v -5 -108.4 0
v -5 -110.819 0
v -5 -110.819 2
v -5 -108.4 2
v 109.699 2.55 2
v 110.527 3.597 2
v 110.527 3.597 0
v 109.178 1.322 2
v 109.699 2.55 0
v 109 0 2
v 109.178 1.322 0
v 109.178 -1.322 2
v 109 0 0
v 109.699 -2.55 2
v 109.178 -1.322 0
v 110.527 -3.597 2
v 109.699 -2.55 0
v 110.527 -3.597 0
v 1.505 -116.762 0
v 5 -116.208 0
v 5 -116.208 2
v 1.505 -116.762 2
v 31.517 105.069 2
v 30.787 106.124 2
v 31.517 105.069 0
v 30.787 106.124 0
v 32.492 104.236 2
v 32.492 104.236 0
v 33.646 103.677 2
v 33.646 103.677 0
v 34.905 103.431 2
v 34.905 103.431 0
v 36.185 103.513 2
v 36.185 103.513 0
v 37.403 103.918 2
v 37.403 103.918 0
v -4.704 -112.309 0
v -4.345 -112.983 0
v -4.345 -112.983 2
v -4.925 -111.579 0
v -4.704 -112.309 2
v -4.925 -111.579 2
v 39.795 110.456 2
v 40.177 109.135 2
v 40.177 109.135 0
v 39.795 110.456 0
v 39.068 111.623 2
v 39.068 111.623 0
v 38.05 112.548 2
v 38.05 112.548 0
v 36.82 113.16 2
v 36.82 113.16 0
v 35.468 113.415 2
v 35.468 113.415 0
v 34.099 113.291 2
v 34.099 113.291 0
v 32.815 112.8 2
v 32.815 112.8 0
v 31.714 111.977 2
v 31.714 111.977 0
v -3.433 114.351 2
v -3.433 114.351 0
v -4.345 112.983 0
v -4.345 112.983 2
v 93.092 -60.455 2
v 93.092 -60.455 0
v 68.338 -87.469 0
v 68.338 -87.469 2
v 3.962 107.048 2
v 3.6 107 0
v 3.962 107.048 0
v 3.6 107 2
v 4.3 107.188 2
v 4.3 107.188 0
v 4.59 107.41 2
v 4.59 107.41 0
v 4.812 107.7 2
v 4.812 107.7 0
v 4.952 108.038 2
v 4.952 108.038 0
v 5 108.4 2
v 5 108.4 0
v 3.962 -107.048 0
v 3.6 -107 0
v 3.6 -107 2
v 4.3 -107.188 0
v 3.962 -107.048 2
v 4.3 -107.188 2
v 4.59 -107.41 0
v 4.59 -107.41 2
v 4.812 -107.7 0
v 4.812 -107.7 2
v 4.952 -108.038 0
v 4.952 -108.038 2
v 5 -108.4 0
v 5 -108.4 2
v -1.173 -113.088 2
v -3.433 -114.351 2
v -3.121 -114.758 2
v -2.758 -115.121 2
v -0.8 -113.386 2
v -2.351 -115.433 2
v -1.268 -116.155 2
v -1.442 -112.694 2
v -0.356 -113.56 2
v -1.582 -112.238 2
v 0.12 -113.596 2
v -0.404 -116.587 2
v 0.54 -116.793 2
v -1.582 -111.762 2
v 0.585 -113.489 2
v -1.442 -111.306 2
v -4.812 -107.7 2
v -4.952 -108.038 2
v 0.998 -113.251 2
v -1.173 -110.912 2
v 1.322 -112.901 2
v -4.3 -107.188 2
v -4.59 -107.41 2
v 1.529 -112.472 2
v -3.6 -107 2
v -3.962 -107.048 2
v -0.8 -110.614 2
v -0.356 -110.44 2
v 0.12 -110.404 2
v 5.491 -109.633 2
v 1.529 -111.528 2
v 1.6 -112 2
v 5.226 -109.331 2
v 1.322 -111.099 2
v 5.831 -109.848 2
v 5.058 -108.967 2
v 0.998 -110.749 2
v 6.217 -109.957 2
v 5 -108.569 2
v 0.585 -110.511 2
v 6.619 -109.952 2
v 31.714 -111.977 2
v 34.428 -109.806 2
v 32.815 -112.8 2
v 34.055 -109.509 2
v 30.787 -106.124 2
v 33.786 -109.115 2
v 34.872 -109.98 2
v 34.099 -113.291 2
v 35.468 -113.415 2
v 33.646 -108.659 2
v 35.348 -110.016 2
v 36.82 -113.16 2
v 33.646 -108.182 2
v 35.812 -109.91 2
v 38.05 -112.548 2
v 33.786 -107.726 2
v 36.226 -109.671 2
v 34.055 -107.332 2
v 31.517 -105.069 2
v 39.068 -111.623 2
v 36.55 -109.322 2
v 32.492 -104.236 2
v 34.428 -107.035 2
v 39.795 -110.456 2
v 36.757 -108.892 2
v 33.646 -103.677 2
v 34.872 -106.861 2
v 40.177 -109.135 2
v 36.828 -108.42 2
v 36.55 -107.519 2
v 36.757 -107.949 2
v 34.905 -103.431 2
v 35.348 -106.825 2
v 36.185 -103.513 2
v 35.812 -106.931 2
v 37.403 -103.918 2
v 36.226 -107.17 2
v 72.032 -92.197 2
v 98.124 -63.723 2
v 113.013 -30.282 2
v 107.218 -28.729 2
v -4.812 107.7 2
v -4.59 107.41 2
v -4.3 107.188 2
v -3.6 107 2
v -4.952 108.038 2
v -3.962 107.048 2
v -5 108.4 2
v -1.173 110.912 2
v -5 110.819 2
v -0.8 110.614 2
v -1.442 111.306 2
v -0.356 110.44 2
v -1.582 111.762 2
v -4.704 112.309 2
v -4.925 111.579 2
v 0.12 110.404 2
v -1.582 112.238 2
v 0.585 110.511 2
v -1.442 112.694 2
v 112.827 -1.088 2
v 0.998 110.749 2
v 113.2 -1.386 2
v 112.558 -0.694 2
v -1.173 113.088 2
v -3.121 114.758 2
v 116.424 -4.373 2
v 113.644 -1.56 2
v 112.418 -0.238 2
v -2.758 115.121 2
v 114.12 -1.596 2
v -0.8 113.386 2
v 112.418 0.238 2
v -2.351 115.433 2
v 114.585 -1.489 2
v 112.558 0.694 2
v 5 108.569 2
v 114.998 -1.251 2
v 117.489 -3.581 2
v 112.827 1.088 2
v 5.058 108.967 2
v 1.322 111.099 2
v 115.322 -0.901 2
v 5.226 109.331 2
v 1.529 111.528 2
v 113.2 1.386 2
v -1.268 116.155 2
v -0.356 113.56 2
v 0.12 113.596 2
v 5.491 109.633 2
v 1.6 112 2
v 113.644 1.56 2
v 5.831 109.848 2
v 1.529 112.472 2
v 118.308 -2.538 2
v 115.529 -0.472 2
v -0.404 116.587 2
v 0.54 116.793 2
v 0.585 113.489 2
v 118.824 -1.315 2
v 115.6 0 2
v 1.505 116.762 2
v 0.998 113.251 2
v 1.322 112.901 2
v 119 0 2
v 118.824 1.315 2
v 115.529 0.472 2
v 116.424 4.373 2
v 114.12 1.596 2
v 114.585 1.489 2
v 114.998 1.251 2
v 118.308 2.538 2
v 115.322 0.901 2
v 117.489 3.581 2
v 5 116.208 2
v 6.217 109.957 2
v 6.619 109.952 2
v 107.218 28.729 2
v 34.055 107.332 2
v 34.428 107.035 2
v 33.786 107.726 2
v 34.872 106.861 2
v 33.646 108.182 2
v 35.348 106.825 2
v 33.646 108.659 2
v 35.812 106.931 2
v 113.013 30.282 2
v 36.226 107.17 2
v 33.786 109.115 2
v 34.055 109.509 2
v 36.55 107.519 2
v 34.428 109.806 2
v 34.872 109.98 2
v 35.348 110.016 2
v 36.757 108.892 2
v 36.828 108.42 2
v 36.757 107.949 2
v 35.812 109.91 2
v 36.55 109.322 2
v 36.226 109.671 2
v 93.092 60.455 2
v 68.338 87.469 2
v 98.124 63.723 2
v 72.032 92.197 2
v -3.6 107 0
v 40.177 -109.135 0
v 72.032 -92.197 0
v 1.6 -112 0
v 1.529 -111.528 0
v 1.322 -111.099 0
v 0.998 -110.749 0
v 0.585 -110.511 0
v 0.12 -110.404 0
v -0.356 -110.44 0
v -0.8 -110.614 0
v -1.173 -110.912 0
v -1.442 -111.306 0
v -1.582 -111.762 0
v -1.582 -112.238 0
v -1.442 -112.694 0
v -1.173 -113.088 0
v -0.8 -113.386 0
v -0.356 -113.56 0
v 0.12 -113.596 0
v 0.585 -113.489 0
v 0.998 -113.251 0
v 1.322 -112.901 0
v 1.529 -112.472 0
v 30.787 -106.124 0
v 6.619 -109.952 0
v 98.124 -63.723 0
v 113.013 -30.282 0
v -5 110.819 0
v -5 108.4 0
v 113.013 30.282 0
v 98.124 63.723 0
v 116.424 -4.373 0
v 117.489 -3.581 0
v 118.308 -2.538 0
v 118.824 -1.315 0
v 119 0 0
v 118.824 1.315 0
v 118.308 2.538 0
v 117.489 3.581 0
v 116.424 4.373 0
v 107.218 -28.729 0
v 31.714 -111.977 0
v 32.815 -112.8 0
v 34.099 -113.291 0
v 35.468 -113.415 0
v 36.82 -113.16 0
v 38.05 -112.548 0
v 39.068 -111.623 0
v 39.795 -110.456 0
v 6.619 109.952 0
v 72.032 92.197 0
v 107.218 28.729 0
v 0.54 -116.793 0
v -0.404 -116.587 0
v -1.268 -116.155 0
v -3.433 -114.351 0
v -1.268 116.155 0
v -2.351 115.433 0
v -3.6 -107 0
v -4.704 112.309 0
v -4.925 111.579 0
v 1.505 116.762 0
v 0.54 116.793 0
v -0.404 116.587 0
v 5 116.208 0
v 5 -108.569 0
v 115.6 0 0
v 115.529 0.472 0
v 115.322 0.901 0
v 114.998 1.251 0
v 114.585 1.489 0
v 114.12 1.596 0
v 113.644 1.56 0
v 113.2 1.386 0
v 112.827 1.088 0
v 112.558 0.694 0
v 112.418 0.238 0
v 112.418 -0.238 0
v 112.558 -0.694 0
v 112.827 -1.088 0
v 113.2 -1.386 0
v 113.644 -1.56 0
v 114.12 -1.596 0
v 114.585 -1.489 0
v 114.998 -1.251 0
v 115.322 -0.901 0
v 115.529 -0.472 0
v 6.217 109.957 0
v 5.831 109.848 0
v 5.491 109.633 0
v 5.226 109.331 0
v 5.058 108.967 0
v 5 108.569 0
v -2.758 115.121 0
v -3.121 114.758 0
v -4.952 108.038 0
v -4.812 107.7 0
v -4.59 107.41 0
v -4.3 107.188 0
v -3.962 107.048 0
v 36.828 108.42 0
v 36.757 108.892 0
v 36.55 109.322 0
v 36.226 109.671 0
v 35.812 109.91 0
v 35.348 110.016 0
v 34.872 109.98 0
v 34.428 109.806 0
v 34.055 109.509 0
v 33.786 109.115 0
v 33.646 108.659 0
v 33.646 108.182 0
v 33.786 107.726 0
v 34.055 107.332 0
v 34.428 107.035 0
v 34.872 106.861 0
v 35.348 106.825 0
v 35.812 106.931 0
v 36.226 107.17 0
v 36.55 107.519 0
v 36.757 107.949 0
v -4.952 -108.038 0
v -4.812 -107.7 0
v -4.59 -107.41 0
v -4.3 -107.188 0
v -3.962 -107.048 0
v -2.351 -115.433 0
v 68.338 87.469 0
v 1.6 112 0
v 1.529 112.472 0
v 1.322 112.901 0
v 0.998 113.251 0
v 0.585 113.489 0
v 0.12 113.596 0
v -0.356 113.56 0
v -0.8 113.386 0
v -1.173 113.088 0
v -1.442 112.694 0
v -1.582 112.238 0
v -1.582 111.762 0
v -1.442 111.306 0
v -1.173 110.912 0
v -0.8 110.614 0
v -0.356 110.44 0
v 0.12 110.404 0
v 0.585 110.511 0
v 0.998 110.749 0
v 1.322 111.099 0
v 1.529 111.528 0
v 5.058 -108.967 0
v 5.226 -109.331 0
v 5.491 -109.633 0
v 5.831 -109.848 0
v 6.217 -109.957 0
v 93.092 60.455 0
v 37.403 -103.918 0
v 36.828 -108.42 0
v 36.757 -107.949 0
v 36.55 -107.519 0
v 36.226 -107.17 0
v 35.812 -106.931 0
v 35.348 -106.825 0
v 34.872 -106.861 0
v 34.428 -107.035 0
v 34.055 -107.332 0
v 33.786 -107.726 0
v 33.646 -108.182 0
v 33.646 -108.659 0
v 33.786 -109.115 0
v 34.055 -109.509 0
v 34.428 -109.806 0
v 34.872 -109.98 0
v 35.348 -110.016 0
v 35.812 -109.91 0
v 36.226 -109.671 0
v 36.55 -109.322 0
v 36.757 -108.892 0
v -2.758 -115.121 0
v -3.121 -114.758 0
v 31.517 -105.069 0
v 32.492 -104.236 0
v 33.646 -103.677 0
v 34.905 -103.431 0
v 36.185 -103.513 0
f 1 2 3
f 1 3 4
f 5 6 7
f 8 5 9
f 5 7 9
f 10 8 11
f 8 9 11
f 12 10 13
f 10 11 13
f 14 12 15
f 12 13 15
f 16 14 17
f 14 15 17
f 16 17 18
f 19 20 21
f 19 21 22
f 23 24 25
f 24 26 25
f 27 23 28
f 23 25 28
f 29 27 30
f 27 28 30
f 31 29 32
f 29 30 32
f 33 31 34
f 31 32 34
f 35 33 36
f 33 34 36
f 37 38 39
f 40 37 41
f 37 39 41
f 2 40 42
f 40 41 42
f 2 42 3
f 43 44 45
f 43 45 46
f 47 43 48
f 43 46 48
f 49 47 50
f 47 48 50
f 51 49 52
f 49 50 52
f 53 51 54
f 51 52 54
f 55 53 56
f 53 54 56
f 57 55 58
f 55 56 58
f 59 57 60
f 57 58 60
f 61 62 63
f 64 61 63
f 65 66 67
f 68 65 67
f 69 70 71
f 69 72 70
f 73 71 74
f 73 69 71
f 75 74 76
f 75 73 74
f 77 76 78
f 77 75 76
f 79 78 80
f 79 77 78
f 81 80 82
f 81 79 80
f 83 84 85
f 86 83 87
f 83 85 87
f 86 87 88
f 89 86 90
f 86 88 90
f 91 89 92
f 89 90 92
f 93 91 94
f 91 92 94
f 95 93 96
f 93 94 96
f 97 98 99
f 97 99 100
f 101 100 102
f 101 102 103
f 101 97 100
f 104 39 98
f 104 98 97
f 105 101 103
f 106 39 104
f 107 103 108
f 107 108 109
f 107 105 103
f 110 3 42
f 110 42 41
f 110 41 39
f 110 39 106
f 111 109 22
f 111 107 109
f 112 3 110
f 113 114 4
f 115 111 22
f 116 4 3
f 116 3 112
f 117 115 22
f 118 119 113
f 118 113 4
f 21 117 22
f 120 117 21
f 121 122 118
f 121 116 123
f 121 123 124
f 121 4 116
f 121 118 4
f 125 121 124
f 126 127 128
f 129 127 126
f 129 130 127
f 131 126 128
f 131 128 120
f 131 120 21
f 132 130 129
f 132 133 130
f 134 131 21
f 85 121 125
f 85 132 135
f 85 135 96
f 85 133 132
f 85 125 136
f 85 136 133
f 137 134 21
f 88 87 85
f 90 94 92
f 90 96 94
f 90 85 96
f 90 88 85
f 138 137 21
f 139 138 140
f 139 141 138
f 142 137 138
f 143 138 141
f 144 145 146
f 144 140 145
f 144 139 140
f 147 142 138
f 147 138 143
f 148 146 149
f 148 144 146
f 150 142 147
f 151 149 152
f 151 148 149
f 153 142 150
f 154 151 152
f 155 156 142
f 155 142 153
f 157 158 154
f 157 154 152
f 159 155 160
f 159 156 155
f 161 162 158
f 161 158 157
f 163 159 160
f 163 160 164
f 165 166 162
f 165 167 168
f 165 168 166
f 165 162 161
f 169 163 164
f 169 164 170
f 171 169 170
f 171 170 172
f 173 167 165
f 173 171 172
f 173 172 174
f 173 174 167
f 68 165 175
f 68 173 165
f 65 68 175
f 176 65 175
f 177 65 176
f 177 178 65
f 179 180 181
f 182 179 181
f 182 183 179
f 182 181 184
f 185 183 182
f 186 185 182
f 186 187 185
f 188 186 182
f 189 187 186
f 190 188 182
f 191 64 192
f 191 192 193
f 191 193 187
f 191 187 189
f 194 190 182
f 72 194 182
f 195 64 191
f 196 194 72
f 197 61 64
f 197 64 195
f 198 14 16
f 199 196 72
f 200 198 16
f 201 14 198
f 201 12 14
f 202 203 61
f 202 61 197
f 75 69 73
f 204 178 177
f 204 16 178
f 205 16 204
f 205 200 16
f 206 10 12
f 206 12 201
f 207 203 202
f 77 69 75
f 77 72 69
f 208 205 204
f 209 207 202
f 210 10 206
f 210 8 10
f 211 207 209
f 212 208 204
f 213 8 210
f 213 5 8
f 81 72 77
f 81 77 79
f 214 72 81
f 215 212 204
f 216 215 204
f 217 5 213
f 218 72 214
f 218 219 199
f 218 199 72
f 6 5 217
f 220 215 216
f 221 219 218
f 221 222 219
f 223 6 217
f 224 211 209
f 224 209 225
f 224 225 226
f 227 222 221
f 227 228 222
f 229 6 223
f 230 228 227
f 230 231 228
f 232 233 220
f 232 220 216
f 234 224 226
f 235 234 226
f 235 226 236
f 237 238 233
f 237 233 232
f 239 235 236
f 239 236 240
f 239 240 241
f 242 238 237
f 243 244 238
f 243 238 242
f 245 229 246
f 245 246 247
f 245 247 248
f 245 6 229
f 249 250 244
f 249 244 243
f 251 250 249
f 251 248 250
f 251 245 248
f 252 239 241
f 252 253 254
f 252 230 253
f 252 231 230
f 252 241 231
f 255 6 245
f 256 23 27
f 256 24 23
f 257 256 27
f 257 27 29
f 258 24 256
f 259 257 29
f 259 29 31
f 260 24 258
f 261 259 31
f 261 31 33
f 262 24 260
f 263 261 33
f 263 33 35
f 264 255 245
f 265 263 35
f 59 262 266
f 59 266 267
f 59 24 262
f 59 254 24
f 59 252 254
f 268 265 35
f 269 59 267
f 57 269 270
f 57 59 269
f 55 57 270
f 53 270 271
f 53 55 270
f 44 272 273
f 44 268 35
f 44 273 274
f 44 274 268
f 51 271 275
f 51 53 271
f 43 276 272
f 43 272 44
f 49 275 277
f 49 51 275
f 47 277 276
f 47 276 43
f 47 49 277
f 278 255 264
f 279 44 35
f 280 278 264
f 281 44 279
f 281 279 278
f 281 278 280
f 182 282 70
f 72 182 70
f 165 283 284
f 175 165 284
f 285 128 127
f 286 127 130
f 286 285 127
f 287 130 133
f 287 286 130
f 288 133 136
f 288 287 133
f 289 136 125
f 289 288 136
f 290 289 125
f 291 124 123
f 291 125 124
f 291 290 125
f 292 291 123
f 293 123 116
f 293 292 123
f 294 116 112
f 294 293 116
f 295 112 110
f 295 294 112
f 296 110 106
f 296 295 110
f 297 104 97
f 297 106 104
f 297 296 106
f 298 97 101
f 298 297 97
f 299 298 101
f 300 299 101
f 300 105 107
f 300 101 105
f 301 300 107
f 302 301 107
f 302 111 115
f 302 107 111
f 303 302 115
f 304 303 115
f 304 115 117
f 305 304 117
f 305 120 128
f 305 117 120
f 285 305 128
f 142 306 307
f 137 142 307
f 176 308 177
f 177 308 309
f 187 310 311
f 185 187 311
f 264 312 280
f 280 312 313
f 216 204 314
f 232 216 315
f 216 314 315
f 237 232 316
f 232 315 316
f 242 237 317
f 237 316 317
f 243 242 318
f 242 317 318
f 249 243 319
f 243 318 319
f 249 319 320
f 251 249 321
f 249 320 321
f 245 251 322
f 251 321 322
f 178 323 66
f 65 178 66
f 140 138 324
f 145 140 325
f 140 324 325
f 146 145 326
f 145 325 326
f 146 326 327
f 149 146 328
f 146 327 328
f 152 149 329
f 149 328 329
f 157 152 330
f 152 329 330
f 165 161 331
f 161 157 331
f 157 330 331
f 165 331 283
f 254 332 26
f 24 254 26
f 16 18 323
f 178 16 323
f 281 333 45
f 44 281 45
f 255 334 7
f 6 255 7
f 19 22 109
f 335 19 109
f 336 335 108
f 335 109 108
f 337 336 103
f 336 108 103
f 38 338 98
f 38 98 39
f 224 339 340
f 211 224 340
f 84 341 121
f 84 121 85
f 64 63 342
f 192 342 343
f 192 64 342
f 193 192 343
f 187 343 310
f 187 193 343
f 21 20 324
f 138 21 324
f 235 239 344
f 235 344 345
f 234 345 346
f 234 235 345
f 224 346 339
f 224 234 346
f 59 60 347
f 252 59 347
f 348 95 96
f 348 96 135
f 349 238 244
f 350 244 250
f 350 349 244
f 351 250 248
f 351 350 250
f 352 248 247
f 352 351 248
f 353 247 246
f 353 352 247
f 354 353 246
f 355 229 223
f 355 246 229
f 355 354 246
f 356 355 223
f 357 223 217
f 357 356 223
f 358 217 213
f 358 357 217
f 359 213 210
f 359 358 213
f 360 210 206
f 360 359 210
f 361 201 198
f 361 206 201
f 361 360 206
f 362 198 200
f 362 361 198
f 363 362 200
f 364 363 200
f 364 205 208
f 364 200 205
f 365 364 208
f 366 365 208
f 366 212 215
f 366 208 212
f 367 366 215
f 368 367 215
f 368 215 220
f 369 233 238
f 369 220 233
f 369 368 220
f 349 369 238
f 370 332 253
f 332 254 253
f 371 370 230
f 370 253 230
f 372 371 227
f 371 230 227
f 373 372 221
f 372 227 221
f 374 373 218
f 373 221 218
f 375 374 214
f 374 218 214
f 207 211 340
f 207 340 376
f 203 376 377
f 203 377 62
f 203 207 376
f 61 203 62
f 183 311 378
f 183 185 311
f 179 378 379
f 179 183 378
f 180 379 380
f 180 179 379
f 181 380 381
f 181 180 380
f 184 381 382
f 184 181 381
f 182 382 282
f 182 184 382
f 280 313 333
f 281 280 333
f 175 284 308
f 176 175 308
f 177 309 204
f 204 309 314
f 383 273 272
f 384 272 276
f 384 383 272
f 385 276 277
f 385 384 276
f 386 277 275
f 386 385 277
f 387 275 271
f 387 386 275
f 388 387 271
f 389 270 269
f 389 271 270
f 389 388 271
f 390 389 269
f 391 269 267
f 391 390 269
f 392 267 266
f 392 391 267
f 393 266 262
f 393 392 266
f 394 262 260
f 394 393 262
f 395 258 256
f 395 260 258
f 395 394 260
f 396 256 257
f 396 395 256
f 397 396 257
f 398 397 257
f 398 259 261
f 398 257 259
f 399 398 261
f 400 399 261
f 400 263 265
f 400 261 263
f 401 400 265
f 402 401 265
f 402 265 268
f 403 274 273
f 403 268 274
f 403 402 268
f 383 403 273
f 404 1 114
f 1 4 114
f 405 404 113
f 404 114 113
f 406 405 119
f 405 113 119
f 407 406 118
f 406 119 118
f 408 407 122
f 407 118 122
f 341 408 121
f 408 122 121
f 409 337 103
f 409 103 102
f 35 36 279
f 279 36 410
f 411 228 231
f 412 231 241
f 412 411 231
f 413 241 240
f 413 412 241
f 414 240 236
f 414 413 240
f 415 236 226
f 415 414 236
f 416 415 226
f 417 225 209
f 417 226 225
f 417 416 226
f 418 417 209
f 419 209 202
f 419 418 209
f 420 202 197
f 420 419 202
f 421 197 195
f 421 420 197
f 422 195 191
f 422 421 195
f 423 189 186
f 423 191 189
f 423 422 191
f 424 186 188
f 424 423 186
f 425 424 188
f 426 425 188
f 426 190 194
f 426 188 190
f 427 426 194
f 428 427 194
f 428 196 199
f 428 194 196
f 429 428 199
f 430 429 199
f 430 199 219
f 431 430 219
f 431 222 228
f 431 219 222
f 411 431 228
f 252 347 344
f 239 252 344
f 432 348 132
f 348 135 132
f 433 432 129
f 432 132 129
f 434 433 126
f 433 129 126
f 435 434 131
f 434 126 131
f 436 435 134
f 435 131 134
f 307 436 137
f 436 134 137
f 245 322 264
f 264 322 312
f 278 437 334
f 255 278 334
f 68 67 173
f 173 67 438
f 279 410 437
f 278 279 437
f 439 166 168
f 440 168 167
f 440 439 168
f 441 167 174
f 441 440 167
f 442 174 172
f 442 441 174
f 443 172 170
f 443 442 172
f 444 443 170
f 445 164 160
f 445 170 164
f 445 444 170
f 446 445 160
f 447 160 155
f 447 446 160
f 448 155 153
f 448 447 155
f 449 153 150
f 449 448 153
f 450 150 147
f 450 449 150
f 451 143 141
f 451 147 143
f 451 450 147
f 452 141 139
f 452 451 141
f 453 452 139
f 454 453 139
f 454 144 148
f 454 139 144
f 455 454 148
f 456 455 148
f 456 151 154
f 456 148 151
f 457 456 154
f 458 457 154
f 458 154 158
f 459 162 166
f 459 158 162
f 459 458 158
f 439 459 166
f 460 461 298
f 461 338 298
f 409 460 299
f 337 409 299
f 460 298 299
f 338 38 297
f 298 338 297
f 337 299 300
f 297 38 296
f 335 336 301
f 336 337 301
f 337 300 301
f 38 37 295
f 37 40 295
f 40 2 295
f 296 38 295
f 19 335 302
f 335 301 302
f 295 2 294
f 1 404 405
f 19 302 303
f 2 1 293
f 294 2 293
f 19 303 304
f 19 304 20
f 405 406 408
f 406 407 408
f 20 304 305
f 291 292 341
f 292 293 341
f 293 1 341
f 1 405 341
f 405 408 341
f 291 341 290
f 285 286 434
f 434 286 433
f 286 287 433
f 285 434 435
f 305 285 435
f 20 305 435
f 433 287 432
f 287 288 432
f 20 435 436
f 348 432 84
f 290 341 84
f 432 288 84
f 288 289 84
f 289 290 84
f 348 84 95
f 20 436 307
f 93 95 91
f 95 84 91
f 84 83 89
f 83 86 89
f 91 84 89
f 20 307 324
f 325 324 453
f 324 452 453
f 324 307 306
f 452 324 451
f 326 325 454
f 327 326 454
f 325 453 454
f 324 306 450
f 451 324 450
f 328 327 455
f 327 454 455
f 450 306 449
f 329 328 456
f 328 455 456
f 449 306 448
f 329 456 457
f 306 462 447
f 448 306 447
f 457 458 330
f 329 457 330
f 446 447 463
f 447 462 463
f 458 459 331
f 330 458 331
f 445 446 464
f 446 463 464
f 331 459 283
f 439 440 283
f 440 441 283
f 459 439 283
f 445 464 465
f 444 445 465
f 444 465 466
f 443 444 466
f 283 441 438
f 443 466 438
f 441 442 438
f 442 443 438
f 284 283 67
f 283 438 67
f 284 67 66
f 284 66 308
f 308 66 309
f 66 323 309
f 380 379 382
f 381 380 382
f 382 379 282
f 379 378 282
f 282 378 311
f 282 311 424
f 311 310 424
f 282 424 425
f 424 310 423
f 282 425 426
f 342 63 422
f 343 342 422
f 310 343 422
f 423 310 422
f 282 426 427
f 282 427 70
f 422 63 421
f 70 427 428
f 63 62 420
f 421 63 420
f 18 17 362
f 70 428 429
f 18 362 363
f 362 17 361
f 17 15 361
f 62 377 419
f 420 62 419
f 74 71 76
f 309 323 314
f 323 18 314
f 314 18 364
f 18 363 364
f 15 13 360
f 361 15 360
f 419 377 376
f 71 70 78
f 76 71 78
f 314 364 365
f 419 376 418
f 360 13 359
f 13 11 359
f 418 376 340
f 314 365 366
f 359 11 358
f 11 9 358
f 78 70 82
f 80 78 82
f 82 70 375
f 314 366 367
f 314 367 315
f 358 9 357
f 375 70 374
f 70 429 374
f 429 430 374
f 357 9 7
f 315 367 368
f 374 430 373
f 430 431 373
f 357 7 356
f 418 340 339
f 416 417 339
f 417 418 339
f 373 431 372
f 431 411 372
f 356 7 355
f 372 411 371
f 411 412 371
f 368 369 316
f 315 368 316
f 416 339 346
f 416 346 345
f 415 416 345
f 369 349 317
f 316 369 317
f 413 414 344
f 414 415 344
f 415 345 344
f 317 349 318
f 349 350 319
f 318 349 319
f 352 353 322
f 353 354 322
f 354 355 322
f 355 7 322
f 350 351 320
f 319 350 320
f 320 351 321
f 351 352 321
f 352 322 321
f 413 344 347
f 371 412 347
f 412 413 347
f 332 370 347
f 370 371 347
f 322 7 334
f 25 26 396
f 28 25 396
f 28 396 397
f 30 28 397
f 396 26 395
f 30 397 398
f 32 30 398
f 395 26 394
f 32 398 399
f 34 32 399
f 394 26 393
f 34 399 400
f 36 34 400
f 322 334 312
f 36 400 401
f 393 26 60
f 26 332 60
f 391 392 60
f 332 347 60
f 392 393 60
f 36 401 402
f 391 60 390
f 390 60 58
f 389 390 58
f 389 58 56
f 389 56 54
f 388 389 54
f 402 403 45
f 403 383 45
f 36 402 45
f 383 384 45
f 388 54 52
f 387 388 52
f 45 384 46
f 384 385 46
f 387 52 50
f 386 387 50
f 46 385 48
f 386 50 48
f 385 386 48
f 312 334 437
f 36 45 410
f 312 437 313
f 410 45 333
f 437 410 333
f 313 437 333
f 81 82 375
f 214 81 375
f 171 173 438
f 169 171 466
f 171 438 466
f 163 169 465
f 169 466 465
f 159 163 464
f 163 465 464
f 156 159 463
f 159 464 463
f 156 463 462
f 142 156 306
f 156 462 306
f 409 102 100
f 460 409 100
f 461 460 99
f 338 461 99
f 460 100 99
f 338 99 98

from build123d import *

# Parameters (mm, degrees)
EXTRUDE_180_DEPTH      = 8
EXTRUDE_START          = 8
SKETCH_2_W             = 6
SKETCH_2_H             = 4
EXTRUDE_457_DEPTH      = 36
EXTRUDE_START_2        = 44
EXTRUDE_180_2_DEPTH    = 3
SKETCH_4_R             = 20
SKETCH_4_R_2           = 4
EXTRUDE_692_DEPTH      = 3
EXTRUDE_745_DEPTH      = 3
EXTRUDE_1_DEPTH        = 3
EXTRUDE_Y_1_DEPTH      = 3
EXTRUDE_1_2_DEPTH      = 3
EXTRUDE_Y_1_2_DEPTH    = 3
CUT_EXTRUDE_START      = 44
CUT_EXTRUDE_1134_DEPTH = 3
SKETCH_11_R            = 5
EXTRUDE_1203_DEPTH     = 3
EXTRUDE_1416_DEPTH     = 8
SKETCH_13_R            = 1.6
CUT_EXTRUDE_1487_DEPTH = 3
SKETCH_14_R            = 1.6
CUT_EXTRUDE_1548_DEPTH = 8
CUT_EXTRUDE_START_2    = 8
SKETCH_15_W            = 600
SKETCH_15_H            = 600
CUT_EXTRUDE_1608_DEPTH = 60
F_2MM_DEPTH            = 8
SKETCH_17_R            = 5
EXTRUDE_M3_DEPTH       = 8
SKETCH_18_R            = 5
EXTRUDE_3_DEPTH        = 8
SKETCH_19_R            = 5
EXTRUDE_4_DEPTH        = 8
SKETCH_20_R            = 1.6
CUT_EXTRUDE_M3_DEPTH   = 8
F_40MM_4MM_D6P2_START  = 4
SKETCH_21_R            = 3.1
F_40MM_4MM_D6P2_DEPTH  = 4
R3P9_R                 = 3.9
F_2MM_0_2_START        = 2
SKETCH_22_W            = 600
SKETCH_22_H            = 600
F_2MM_0_2_DEPTH        = 8
FILLET_4_R             = 1.4


with BuildPart() as part:
    # 草图1 → Extrude 180 (new body)
    with BuildSketch(Plane.XY):
        Polygon((0, -115), (35.536954353, -109.371499374), (70.801069662, -90.621236665), (96.447115314, -62.633489027), (111.081470023, -29.764190187), (115, 0), (111.081470023, 29.764190187), (96.447115314, 62.633489027), (70.801069662, 90.621236665), (35.536954353, 109.371499374), (0, 115), (0, 111), (34.300886376, 105.567273309), (68.338423761, 87.46919365), (93.092433042, 60.454932887), (107.217766718, 28.728914006), (111, 0), (107.217766718, -28.728914006), (93.092433042, -60.454932887), (68.338423761, -87.46919365), (34.300886376, -105.567273309), (0, -111), align=None)
    extrude(amount=EXTRUDE_180_DEPTH)

    # 草图2 → Extrude 457 (add)
    with BuildSketch(Plane.XY.offset(EXTRUDE_START)):
        Polygon((35.584965419, -103.047126287), (37.439067386, -108.753465385), (33.634841321, -109.989533363), (31.780739354, -104.283194265), align=None)
        with Locations((112, 0)):
            Rectangle(SKETCH_2_W, SKETCH_2_H)
        Polygon((31.780739354, 104.283194265), (33.634841321, 109.989533363), (37.439067386, 108.753465385), (35.584965419, 103.047126287), align=None)
    extrude(amount=EXTRUDE_457_DEPTH)

    # 草图3 → Extrude 180 2 (add)
    with BuildSketch(Plane.XY.offset(EXTRUDE_START_2)):
        Polygon((0, -115), (35.536954353, -109.371499374), (70.801069662, -90.621236665), (96.447115314, -62.633489027), (111.081470023, -29.764190187), (115, 0), (111.081470023, 29.764190187), (96.447115314, 62.633489027), (70.801069662, 90.621236665), (35.536954353, 109.371499374), (0, 115), (0, 109), (33.682852387, 103.665160276), (67.10710081, 85.893172143), (91.415091906, 59.365654817), (105.285915066, 28.211275916), (109, 0), (105.285915066, -28.211275916), (91.415091906, -59.365654817), (67.10710081, -85.893172143), (33.682852387, -103.665160276), (0, -109), align=None)
    extrude(amount=EXTRUDE_180_2_DEPTH)



with BuildPart() as body_2:
    # 草图4 → Extrude 692 (new body)
    with BuildSketch(Plane.XY.offset(EXTRUDE_START_2)):
        Circle(SKETCH_4_R)
        Circle(SKETCH_4_R_2, mode=Mode.SUBTRACT)
    extrude(amount=EXTRUDE_692_DEPTH)


with BuildPart() as part_1:
    add(part.part)

    add(body_2.part)  # Extrude 745 merges body 2
    # 草图5 → Extrude 745 (add)
    with BuildSketch(Plane.XY.offset(EXTRUDE_START_2)):
        Polygon((17, -9), (113, -2.5), (113, 2.5), (17, 9), align=None)
    extrude(amount=EXTRUDE_745_DEPTH)

    # 草图6 → Extrude 1 (add)
    with BuildSketch(Plane.XY.offset(EXTRUDE_START_2)):
        Polygon((-5.736735419, -8.734652509), (31.330903272, -107.096180364), (26.669096728, -108.903819636), (-12.263264581, -11.265347491), align=None)
    extrude(amount=EXTRUDE_1_DEPTH)

    # 草图7 → Extrude Y__-1 (add)
    with BuildSketch(Plane.XY.offset(EXTRUDE_START_2)):
        Polygon((60.213265383, 1.279918343), (91.234949037, -66.240061243), (87.165050963, -68.159938757), (54.786734617, -1.279918343), align=None)
    extrude(amount=EXTRUDE_Y_1_DEPTH)

    # 草图8 → Extrude 1 2 (add)
    with BuildSketch(Plane.XY.offset(EXTRUDE_START_2)):
        Polygon((-12.263264581, 11.265347491), (26.669096728, 108.903819636), (31.330903272, 107.096180364), (-5.736735419, 8.734652509), align=None)
    extrude(amount=EXTRUDE_1_2_DEPTH)

    # 草图9 → Extrude Y__1 2 (add)
    with BuildSketch(Plane.XY.offset(EXTRUDE_START_2)):
        Polygon((54.786734617, 1.279918343), (87.165050963, 68.159938757), (91.234949037, 66.240061243), (60.213265383, -1.279918343), align=None)
    extrude(amount=EXTRUDE_Y_1_2_DEPTH)

    # 草图10 → Cut-Extrude 1134 (cut)
    with BuildSketch(Plane.XY.offset(CUT_EXTRUDE_START)):
        Polygon((18, -4.5), (18, 4.5), (80.33, 0), align=None)
    extrude(amount=CUT_EXTRUDE_1134_DEPTH, mode=Mode.SUBTRACT)

    # 草图11 → Extrude 1203 (add)
    with BuildSketch(Plane.XY.offset(EXTRUDE_START_2)):
        with Locations((0, 112)):
            Circle(SKETCH_11_R)
        with Locations((0, -112)):
            Circle(SKETCH_11_R)
    extrude(amount=EXTRUDE_1203_DEPTH)

    # 草图12 → Extrude 1416 (add)
    with BuildSketch(Plane.XY):
        Polygon((-5, -107), (5, -107), (5, -116.208077798), (0, -117), (-3, -115), (-5, -112), align=None)
        Polygon((-5, 107), (5, 107), (5, 116.208077798), (0, 117), (-3, 115), (-5, 112), align=None)
    extrude(amount=EXTRUDE_1416_DEPTH)

    # 草图13 → Cut-Extrude 1487 (cut)
    with BuildSketch(Plane.XY.offset(CUT_EXTRUDE_START)):
        with Locations((13.435028843, 0)):
            Circle(SKETCH_13_R)
        with Locations((-13.435028843, 0)):
            Circle(SKETCH_13_R)
        with Locations((0, 13.435028843)):
            Circle(SKETCH_13_R)
        with Locations((0, -13.435028843)):
            Circle(SKETCH_13_R)
        with Locations((0, 112)):
            Circle(SKETCH_13_R)
        with Locations((0, -112)):
            Circle(SKETCH_13_R)
    extrude(amount=CUT_EXTRUDE_1487_DEPTH, mode=Mode.SUBTRACT)

    # 草图14 → Cut-Extrude 1548 (cut)
    with BuildSketch(Plane.XY):
        with Locations((0, 112)):
            Circle(SKETCH_14_R)
        with Locations((0, -112)):
            Circle(SKETCH_14_R)
    extrude(amount=CUT_EXTRUDE_1548_DEPTH, mode=Mode.SUBTRACT)

    # 草图15 → Cut-Extrude 1608 (cut)
    with BuildSketch(Plane.XY.offset(CUT_EXTRUDE_START_2)):
        Rectangle(SKETCH_15_W, SKETCH_15_H)
    extrude(amount=CUT_EXTRUDE_1608_DEPTH, mode=Mode.SUBTRACT)

    # 草图16 → 外圈径向加厚2mm (add)
    with BuildSketch(Plane.XY):
        Polygon((0, -117), (36.154988342, -111.273612407), (72.032392613, -92.197258172), (98.12445645, -63.722767097), (113.013321676, -30.281828277), (117, 0), (113.013321676, 30.281828277), (98.12445645, 63.722767097), (72.032392613, 92.197258172), (36.154988342, 111.273612407), (0, 117), (0, 114), (35.227937359, 108.420442858), (70.185408187, 89.833225911), (95.608444746, 62.088849992), (110.115544197, 29.505371142), (114, 0), (110.115544197, -29.505371142), (95.608444746, -62.088849992), (70.185408187, -89.833225911), (35.227937359, -108.420442858), (0, -114), align=None)
    extrude(amount=F_2MM_DEPTH)

    # 草图17 → M3铝柱下定位耳 (add)
    with BuildSketch(Plane.XY):
        with Locations((35.227937359, -108.420442858)):
            Circle(SKETCH_17_R)
    extrude(amount=EXTRUDE_M3_DEPTH)

    # 草图18 → 凸台-拉伸3 (add)
    with BuildSketch(Plane.XY):
        with Locations((114, 0)):
            Circle(SKETCH_18_R)
    extrude(amount=EXTRUDE_3_DEPTH)

    # 草图19 → 凸台-拉伸4 (add)
    with BuildSketch(Plane.XY):
        with Locations((35.227937359, 108.420442858)):
            Circle(SKETCH_19_R)
    extrude(amount=EXTRUDE_4_DEPTH)

    # 草图20 → 三处M3下层固定孔 (cut)
    with BuildSketch(Plane.XY):
        with Locations((35.227937359, -108.420442858)):
            Circle(SKETCH_20_R)
        with Locations((114, 0)):
            Circle(SKETCH_20_R)
        with Locations((35.227937359, 108.420442858)):
            Circle(SKETCH_20_R)
    extrude(amount=CUT_EXTRUDE_M3_DEPTH, mode=Mode.SUBTRACT)

    # 草图21 → 40mm铝柱沉座_深4mm_D6p2 (cut)
    with BuildSketch(Plane.XY.offset(F_40MM_4MM_D6P2_START)):
        with Locations((35.227937359, -108.420442858)):
            Circle(SKETCH_21_R)
        with Locations((114, 0)):
            Circle(SKETCH_21_R)
        with Locations((35.227937359, 108.420442858)):
            Circle(SKETCH_21_R)
    extrude(amount=F_40MM_4MM_D6P2_DEPTH, mode=Mode.SUBTRACT)

    # 下端耳外缘圆角_R3p9_轮廓内收
    r3p9_edges = [part_1.edges().sort_by_distance(p)[0] for p in [
        (-5, -112, 4),
        (-3, -115, 4),
        (0, -117, 4),
        (-5, 112, 4),
        (0, 117, 4),
        (-3, 115, 4),
    ]]
    fillet(r3p9_edges, radius=R3P9_R)

    # 草图22 → 统一2mm板厚_下层保留0至2 (cut)
    with BuildSketch(Plane.XY.offset(F_2MM_0_2_START)):
        Rectangle(SKETCH_22_W, SKETCH_22_H)
    extrude(amount=F_2MM_0_2_DEPTH, mode=Mode.SUBTRACT)

    # 圆角4
    fillet_4_edges = [part_1.edges().sort_by_distance(p)[0] for p in [
        (5, 110.208077798, 1),
        (5, 107, 1),
        (-5, 107, 1),
        (-5, -107, 1),
        (5, -107, 1),
        (5, -110.208077798, 1),
    ]]
    fillet(fillet_4_edges, radius=FILLET_4_R)


solid = part_1.part
